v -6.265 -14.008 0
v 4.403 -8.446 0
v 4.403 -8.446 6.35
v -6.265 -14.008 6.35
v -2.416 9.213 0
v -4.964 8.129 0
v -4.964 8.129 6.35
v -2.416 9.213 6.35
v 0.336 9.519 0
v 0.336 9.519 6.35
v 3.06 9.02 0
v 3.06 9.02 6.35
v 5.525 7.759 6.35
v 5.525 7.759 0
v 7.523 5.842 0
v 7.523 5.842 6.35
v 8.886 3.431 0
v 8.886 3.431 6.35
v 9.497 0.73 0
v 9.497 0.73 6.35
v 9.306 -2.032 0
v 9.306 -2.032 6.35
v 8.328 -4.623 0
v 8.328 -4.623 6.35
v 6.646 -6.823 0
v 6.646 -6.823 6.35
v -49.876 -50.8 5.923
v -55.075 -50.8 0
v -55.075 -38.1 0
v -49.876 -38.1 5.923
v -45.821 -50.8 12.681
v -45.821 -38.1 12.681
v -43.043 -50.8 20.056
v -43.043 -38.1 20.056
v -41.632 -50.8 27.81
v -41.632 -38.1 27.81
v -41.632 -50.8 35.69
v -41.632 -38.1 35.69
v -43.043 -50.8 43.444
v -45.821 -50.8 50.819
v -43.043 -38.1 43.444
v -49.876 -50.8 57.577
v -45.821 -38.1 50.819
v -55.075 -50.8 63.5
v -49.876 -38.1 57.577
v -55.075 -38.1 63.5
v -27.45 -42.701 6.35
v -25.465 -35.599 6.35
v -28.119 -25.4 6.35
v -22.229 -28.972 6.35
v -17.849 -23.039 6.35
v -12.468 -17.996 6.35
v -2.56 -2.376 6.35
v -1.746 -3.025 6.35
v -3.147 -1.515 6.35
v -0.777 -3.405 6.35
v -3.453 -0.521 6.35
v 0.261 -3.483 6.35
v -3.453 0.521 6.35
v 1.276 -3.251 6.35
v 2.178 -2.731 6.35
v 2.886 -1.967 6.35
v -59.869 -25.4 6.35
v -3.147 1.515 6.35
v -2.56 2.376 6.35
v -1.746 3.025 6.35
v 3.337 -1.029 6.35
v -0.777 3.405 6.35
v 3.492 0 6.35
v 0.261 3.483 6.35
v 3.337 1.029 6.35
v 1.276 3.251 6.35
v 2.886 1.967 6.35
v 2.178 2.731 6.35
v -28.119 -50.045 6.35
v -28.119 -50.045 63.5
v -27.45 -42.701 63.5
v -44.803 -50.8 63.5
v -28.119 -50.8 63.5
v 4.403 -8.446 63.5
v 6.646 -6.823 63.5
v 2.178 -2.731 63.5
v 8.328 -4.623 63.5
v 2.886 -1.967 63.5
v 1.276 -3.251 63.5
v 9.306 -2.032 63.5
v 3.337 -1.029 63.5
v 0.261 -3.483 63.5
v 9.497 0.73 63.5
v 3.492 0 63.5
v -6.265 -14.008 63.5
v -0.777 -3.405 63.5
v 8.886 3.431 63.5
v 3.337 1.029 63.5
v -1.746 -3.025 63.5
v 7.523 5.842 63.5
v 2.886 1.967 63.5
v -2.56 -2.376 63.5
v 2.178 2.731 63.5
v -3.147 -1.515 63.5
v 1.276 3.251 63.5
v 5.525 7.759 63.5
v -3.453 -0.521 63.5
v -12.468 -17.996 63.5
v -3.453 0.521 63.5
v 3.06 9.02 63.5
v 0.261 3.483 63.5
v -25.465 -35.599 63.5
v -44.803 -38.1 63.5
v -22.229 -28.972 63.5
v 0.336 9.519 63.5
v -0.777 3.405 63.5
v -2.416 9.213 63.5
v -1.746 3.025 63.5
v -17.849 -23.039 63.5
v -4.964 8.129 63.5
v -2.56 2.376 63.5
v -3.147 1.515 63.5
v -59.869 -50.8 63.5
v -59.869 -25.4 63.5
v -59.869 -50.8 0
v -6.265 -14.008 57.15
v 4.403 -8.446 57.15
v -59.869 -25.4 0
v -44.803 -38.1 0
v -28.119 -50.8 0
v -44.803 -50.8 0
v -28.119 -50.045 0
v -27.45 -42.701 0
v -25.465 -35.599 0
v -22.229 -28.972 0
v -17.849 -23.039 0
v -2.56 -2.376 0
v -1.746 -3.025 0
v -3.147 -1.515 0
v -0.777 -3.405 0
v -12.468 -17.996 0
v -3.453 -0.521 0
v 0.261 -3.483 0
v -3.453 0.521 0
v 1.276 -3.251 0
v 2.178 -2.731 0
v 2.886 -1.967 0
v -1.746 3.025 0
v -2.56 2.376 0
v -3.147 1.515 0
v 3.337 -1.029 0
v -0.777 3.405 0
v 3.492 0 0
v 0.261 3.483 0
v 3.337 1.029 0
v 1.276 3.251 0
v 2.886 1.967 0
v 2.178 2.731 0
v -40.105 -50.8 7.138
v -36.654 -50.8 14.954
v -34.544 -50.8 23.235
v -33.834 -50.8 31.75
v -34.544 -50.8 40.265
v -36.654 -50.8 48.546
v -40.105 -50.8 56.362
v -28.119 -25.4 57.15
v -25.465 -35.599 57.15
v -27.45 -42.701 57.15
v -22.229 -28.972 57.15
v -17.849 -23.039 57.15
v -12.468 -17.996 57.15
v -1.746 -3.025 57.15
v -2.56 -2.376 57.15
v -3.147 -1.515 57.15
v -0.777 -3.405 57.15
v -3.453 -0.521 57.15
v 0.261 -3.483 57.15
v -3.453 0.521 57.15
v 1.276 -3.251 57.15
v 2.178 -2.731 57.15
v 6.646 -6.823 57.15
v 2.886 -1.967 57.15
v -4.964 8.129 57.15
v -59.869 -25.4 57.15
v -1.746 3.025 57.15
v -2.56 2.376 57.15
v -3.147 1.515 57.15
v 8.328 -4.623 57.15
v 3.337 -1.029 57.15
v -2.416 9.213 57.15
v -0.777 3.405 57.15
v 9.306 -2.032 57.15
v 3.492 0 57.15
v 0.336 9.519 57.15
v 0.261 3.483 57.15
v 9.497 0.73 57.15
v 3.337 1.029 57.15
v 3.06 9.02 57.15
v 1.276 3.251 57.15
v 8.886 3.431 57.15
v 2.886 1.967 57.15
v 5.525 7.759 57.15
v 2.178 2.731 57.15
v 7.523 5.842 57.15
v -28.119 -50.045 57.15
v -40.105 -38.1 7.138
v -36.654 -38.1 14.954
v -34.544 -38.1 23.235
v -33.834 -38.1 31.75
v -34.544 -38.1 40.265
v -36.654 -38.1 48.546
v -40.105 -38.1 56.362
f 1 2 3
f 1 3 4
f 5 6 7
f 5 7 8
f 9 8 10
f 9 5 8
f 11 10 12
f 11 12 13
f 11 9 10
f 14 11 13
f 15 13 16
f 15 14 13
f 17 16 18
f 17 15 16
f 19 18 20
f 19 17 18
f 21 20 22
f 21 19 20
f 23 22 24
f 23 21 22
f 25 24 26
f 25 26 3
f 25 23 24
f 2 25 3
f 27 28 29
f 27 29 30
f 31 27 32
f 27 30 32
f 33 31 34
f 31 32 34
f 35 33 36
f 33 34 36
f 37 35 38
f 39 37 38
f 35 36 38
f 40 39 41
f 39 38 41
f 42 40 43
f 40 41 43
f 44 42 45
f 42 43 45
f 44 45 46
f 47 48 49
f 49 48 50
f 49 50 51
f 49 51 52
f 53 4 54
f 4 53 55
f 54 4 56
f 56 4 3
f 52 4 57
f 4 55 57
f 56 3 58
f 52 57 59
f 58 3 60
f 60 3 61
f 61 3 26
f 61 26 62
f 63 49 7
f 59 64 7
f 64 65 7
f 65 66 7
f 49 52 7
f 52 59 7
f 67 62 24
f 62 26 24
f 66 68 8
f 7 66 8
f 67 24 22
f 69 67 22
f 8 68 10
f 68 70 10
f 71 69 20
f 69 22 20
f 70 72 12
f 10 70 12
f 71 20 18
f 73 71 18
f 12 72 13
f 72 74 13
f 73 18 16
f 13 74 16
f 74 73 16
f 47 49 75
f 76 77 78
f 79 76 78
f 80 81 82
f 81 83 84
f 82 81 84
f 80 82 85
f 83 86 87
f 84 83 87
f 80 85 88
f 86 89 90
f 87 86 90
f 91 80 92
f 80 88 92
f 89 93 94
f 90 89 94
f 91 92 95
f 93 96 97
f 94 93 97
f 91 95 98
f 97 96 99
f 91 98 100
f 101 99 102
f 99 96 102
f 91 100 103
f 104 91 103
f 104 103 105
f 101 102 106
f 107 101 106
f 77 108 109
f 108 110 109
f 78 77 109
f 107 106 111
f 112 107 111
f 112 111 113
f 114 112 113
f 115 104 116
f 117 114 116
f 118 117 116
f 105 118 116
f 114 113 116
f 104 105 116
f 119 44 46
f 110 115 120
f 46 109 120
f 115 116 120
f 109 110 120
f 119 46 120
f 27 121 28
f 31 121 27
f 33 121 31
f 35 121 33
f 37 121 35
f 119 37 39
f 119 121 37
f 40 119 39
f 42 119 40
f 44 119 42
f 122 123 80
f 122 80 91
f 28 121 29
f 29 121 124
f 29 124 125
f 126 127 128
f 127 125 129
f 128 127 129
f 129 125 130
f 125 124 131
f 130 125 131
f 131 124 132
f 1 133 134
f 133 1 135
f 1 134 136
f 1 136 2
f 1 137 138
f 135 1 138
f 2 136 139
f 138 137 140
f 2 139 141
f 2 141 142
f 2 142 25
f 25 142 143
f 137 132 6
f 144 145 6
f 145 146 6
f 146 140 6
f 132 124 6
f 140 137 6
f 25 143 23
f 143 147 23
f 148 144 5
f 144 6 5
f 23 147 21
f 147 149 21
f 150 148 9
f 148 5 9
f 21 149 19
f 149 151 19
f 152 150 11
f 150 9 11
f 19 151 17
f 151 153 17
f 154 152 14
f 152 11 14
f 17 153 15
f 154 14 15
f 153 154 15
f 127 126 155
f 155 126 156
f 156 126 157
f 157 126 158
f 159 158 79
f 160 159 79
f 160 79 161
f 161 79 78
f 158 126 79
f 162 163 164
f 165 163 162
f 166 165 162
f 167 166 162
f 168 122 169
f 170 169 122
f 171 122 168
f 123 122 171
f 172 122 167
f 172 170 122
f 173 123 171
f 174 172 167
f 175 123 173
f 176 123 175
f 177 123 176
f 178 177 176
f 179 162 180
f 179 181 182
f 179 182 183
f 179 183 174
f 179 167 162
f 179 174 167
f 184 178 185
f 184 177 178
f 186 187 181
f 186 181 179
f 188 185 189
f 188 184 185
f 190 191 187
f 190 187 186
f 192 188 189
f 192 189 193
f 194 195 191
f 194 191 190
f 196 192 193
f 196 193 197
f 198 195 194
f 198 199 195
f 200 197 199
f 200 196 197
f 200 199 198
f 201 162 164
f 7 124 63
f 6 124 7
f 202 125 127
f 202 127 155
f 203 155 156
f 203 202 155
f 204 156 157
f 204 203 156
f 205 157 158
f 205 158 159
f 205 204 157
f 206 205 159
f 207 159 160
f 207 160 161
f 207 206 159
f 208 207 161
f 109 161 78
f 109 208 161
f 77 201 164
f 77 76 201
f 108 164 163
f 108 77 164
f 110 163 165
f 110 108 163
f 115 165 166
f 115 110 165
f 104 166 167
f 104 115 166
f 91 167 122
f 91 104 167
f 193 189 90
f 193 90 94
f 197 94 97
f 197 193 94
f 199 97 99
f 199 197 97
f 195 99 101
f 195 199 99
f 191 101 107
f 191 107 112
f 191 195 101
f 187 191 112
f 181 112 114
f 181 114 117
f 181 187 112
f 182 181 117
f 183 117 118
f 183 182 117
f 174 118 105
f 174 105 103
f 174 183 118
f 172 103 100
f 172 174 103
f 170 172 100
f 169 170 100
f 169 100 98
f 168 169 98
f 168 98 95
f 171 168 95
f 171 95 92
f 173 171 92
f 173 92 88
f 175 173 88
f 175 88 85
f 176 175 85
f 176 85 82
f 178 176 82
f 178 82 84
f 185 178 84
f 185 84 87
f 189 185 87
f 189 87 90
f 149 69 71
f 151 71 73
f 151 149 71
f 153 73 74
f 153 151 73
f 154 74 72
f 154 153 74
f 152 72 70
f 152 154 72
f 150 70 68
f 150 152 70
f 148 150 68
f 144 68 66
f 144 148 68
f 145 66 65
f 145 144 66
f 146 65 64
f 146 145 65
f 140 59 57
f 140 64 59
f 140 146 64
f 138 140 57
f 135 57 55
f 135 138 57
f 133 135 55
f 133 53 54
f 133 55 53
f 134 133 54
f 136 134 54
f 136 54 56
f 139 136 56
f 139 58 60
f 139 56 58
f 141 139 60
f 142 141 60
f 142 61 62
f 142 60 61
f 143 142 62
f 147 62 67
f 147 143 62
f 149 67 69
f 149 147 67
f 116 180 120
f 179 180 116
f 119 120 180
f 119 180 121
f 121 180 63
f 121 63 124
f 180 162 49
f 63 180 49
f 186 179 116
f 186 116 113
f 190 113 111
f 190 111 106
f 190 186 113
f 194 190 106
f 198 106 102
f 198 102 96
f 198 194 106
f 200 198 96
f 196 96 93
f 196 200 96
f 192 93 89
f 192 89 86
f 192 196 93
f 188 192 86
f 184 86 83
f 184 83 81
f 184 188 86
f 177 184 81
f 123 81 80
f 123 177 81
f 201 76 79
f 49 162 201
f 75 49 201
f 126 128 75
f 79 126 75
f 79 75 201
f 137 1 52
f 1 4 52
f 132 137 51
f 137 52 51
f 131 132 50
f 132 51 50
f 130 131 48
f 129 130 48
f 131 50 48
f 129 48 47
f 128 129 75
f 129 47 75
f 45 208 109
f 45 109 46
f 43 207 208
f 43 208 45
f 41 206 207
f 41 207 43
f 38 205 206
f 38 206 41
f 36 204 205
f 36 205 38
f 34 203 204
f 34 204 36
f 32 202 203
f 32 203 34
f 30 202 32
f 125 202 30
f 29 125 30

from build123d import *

# Parameters (mm, degrees)
SKETCH1_R               = 3.4925
BOSS_EXTRUDE1_DEPTH     = 63.5
SKETCH2_W               = 50.8
SKETCH2_H               = 34.925
CUT_EXTRUDE1_DEPTH      = 10.525
CUT_EXTRUDE1_DEPTH_BACK = 60.869090512
BOSS_EXTRUDE2_DEPTH     = 12.7
FILLET2_R               = 40.64


with BuildPart() as part:
    # Sketch1 → Boss-Extrude1 (new body)
    with BuildSketch(Plane.XY):
        with BuildLine():
            Line((-59.869090512, -25.4), (-4.964236422, 8.129082467))
            ThreePointArc((-4.964236422, 8.129082467), (8.292412041, 4.686312788), (4.403021401, -8.446243398))
            Line((4.403021401, -8.446243398), (-28.119090512, -25.4))
            Line((-28.119090512, -25.4), (-28.119090512, -38.1))
            Line((-28.119090512, -38.1), (-59.869090512, -38.1))
            Line((-59.869090512, -38.1), (-59.869090512, -25.4))
        make_face()
        Circle(SKETCH1_R, mode=Mode.SUBTRACT)
    extrude(amount=BOSS_EXTRUDE1_DEPTH)

    # Sketch2 → Cut-Extrude1 (cut, two sides)
    with BuildSketch(Plane(origin=(0, 0, 0), x_dir=(0, 0, -1), z_dir=(1, 0, 0))) as cut_extrude1_sk:
        with Locations((-31.75, -7.9375)):
            Rectangle(SKETCH2_W, SKETCH2_H)
    extrude(amount=CUT_EXTRUDE1_DEPTH, mode=Mode.SUBTRACT)
    extrude(cut_extrude1_sk.sketch, amount=-CUT_EXTRUDE1_DEPTH_BACK, mode=Mode.SUBTRACT)

    # Sketch3 → Boss-Extrude2 (add)
    with BuildSketch(Plane.XZ.offset(38.1)):
        with BuildLine():
            Line((-55.074857205, 63.5), (-59.869090512, 63.5))
            Line((-59.869090512, 63.5), (-59.869090512, 0))
            Line((-59.869090512, 0), (-55.074857205, 0))
            ThreePointArc((-55.074857205, 0), (-41.454090512, 31.75), (-55.074857205, 63.5))
        make_face()
        with BuildLine():
            Line((-44.803095838, 63.5), (-28.119090512, 63.5))
            Line((-28.119090512, 63.5), (-28.119090512, 0))
            Line((-28.119090512, 0), (-44.803095838, 0))
            ThreePointArc((-44.803095838, 0), (-33.834090512, 31.75), (-44.803095838, 63.5))
        make_face()
    extrude(amount=BOSS_EXTRUDE2_DEPTH)

    # Fillet2
    fillet2_edges = [part.edges().sort_by_distance(p)[0] for p in [
        (-28.119090512, -25.4, 60.325),
        (-28.119090512, -25.4, 3.175),
    ]]
    fillet(fillet2_edges, radius=FILLET2_R)


solid = part.part
